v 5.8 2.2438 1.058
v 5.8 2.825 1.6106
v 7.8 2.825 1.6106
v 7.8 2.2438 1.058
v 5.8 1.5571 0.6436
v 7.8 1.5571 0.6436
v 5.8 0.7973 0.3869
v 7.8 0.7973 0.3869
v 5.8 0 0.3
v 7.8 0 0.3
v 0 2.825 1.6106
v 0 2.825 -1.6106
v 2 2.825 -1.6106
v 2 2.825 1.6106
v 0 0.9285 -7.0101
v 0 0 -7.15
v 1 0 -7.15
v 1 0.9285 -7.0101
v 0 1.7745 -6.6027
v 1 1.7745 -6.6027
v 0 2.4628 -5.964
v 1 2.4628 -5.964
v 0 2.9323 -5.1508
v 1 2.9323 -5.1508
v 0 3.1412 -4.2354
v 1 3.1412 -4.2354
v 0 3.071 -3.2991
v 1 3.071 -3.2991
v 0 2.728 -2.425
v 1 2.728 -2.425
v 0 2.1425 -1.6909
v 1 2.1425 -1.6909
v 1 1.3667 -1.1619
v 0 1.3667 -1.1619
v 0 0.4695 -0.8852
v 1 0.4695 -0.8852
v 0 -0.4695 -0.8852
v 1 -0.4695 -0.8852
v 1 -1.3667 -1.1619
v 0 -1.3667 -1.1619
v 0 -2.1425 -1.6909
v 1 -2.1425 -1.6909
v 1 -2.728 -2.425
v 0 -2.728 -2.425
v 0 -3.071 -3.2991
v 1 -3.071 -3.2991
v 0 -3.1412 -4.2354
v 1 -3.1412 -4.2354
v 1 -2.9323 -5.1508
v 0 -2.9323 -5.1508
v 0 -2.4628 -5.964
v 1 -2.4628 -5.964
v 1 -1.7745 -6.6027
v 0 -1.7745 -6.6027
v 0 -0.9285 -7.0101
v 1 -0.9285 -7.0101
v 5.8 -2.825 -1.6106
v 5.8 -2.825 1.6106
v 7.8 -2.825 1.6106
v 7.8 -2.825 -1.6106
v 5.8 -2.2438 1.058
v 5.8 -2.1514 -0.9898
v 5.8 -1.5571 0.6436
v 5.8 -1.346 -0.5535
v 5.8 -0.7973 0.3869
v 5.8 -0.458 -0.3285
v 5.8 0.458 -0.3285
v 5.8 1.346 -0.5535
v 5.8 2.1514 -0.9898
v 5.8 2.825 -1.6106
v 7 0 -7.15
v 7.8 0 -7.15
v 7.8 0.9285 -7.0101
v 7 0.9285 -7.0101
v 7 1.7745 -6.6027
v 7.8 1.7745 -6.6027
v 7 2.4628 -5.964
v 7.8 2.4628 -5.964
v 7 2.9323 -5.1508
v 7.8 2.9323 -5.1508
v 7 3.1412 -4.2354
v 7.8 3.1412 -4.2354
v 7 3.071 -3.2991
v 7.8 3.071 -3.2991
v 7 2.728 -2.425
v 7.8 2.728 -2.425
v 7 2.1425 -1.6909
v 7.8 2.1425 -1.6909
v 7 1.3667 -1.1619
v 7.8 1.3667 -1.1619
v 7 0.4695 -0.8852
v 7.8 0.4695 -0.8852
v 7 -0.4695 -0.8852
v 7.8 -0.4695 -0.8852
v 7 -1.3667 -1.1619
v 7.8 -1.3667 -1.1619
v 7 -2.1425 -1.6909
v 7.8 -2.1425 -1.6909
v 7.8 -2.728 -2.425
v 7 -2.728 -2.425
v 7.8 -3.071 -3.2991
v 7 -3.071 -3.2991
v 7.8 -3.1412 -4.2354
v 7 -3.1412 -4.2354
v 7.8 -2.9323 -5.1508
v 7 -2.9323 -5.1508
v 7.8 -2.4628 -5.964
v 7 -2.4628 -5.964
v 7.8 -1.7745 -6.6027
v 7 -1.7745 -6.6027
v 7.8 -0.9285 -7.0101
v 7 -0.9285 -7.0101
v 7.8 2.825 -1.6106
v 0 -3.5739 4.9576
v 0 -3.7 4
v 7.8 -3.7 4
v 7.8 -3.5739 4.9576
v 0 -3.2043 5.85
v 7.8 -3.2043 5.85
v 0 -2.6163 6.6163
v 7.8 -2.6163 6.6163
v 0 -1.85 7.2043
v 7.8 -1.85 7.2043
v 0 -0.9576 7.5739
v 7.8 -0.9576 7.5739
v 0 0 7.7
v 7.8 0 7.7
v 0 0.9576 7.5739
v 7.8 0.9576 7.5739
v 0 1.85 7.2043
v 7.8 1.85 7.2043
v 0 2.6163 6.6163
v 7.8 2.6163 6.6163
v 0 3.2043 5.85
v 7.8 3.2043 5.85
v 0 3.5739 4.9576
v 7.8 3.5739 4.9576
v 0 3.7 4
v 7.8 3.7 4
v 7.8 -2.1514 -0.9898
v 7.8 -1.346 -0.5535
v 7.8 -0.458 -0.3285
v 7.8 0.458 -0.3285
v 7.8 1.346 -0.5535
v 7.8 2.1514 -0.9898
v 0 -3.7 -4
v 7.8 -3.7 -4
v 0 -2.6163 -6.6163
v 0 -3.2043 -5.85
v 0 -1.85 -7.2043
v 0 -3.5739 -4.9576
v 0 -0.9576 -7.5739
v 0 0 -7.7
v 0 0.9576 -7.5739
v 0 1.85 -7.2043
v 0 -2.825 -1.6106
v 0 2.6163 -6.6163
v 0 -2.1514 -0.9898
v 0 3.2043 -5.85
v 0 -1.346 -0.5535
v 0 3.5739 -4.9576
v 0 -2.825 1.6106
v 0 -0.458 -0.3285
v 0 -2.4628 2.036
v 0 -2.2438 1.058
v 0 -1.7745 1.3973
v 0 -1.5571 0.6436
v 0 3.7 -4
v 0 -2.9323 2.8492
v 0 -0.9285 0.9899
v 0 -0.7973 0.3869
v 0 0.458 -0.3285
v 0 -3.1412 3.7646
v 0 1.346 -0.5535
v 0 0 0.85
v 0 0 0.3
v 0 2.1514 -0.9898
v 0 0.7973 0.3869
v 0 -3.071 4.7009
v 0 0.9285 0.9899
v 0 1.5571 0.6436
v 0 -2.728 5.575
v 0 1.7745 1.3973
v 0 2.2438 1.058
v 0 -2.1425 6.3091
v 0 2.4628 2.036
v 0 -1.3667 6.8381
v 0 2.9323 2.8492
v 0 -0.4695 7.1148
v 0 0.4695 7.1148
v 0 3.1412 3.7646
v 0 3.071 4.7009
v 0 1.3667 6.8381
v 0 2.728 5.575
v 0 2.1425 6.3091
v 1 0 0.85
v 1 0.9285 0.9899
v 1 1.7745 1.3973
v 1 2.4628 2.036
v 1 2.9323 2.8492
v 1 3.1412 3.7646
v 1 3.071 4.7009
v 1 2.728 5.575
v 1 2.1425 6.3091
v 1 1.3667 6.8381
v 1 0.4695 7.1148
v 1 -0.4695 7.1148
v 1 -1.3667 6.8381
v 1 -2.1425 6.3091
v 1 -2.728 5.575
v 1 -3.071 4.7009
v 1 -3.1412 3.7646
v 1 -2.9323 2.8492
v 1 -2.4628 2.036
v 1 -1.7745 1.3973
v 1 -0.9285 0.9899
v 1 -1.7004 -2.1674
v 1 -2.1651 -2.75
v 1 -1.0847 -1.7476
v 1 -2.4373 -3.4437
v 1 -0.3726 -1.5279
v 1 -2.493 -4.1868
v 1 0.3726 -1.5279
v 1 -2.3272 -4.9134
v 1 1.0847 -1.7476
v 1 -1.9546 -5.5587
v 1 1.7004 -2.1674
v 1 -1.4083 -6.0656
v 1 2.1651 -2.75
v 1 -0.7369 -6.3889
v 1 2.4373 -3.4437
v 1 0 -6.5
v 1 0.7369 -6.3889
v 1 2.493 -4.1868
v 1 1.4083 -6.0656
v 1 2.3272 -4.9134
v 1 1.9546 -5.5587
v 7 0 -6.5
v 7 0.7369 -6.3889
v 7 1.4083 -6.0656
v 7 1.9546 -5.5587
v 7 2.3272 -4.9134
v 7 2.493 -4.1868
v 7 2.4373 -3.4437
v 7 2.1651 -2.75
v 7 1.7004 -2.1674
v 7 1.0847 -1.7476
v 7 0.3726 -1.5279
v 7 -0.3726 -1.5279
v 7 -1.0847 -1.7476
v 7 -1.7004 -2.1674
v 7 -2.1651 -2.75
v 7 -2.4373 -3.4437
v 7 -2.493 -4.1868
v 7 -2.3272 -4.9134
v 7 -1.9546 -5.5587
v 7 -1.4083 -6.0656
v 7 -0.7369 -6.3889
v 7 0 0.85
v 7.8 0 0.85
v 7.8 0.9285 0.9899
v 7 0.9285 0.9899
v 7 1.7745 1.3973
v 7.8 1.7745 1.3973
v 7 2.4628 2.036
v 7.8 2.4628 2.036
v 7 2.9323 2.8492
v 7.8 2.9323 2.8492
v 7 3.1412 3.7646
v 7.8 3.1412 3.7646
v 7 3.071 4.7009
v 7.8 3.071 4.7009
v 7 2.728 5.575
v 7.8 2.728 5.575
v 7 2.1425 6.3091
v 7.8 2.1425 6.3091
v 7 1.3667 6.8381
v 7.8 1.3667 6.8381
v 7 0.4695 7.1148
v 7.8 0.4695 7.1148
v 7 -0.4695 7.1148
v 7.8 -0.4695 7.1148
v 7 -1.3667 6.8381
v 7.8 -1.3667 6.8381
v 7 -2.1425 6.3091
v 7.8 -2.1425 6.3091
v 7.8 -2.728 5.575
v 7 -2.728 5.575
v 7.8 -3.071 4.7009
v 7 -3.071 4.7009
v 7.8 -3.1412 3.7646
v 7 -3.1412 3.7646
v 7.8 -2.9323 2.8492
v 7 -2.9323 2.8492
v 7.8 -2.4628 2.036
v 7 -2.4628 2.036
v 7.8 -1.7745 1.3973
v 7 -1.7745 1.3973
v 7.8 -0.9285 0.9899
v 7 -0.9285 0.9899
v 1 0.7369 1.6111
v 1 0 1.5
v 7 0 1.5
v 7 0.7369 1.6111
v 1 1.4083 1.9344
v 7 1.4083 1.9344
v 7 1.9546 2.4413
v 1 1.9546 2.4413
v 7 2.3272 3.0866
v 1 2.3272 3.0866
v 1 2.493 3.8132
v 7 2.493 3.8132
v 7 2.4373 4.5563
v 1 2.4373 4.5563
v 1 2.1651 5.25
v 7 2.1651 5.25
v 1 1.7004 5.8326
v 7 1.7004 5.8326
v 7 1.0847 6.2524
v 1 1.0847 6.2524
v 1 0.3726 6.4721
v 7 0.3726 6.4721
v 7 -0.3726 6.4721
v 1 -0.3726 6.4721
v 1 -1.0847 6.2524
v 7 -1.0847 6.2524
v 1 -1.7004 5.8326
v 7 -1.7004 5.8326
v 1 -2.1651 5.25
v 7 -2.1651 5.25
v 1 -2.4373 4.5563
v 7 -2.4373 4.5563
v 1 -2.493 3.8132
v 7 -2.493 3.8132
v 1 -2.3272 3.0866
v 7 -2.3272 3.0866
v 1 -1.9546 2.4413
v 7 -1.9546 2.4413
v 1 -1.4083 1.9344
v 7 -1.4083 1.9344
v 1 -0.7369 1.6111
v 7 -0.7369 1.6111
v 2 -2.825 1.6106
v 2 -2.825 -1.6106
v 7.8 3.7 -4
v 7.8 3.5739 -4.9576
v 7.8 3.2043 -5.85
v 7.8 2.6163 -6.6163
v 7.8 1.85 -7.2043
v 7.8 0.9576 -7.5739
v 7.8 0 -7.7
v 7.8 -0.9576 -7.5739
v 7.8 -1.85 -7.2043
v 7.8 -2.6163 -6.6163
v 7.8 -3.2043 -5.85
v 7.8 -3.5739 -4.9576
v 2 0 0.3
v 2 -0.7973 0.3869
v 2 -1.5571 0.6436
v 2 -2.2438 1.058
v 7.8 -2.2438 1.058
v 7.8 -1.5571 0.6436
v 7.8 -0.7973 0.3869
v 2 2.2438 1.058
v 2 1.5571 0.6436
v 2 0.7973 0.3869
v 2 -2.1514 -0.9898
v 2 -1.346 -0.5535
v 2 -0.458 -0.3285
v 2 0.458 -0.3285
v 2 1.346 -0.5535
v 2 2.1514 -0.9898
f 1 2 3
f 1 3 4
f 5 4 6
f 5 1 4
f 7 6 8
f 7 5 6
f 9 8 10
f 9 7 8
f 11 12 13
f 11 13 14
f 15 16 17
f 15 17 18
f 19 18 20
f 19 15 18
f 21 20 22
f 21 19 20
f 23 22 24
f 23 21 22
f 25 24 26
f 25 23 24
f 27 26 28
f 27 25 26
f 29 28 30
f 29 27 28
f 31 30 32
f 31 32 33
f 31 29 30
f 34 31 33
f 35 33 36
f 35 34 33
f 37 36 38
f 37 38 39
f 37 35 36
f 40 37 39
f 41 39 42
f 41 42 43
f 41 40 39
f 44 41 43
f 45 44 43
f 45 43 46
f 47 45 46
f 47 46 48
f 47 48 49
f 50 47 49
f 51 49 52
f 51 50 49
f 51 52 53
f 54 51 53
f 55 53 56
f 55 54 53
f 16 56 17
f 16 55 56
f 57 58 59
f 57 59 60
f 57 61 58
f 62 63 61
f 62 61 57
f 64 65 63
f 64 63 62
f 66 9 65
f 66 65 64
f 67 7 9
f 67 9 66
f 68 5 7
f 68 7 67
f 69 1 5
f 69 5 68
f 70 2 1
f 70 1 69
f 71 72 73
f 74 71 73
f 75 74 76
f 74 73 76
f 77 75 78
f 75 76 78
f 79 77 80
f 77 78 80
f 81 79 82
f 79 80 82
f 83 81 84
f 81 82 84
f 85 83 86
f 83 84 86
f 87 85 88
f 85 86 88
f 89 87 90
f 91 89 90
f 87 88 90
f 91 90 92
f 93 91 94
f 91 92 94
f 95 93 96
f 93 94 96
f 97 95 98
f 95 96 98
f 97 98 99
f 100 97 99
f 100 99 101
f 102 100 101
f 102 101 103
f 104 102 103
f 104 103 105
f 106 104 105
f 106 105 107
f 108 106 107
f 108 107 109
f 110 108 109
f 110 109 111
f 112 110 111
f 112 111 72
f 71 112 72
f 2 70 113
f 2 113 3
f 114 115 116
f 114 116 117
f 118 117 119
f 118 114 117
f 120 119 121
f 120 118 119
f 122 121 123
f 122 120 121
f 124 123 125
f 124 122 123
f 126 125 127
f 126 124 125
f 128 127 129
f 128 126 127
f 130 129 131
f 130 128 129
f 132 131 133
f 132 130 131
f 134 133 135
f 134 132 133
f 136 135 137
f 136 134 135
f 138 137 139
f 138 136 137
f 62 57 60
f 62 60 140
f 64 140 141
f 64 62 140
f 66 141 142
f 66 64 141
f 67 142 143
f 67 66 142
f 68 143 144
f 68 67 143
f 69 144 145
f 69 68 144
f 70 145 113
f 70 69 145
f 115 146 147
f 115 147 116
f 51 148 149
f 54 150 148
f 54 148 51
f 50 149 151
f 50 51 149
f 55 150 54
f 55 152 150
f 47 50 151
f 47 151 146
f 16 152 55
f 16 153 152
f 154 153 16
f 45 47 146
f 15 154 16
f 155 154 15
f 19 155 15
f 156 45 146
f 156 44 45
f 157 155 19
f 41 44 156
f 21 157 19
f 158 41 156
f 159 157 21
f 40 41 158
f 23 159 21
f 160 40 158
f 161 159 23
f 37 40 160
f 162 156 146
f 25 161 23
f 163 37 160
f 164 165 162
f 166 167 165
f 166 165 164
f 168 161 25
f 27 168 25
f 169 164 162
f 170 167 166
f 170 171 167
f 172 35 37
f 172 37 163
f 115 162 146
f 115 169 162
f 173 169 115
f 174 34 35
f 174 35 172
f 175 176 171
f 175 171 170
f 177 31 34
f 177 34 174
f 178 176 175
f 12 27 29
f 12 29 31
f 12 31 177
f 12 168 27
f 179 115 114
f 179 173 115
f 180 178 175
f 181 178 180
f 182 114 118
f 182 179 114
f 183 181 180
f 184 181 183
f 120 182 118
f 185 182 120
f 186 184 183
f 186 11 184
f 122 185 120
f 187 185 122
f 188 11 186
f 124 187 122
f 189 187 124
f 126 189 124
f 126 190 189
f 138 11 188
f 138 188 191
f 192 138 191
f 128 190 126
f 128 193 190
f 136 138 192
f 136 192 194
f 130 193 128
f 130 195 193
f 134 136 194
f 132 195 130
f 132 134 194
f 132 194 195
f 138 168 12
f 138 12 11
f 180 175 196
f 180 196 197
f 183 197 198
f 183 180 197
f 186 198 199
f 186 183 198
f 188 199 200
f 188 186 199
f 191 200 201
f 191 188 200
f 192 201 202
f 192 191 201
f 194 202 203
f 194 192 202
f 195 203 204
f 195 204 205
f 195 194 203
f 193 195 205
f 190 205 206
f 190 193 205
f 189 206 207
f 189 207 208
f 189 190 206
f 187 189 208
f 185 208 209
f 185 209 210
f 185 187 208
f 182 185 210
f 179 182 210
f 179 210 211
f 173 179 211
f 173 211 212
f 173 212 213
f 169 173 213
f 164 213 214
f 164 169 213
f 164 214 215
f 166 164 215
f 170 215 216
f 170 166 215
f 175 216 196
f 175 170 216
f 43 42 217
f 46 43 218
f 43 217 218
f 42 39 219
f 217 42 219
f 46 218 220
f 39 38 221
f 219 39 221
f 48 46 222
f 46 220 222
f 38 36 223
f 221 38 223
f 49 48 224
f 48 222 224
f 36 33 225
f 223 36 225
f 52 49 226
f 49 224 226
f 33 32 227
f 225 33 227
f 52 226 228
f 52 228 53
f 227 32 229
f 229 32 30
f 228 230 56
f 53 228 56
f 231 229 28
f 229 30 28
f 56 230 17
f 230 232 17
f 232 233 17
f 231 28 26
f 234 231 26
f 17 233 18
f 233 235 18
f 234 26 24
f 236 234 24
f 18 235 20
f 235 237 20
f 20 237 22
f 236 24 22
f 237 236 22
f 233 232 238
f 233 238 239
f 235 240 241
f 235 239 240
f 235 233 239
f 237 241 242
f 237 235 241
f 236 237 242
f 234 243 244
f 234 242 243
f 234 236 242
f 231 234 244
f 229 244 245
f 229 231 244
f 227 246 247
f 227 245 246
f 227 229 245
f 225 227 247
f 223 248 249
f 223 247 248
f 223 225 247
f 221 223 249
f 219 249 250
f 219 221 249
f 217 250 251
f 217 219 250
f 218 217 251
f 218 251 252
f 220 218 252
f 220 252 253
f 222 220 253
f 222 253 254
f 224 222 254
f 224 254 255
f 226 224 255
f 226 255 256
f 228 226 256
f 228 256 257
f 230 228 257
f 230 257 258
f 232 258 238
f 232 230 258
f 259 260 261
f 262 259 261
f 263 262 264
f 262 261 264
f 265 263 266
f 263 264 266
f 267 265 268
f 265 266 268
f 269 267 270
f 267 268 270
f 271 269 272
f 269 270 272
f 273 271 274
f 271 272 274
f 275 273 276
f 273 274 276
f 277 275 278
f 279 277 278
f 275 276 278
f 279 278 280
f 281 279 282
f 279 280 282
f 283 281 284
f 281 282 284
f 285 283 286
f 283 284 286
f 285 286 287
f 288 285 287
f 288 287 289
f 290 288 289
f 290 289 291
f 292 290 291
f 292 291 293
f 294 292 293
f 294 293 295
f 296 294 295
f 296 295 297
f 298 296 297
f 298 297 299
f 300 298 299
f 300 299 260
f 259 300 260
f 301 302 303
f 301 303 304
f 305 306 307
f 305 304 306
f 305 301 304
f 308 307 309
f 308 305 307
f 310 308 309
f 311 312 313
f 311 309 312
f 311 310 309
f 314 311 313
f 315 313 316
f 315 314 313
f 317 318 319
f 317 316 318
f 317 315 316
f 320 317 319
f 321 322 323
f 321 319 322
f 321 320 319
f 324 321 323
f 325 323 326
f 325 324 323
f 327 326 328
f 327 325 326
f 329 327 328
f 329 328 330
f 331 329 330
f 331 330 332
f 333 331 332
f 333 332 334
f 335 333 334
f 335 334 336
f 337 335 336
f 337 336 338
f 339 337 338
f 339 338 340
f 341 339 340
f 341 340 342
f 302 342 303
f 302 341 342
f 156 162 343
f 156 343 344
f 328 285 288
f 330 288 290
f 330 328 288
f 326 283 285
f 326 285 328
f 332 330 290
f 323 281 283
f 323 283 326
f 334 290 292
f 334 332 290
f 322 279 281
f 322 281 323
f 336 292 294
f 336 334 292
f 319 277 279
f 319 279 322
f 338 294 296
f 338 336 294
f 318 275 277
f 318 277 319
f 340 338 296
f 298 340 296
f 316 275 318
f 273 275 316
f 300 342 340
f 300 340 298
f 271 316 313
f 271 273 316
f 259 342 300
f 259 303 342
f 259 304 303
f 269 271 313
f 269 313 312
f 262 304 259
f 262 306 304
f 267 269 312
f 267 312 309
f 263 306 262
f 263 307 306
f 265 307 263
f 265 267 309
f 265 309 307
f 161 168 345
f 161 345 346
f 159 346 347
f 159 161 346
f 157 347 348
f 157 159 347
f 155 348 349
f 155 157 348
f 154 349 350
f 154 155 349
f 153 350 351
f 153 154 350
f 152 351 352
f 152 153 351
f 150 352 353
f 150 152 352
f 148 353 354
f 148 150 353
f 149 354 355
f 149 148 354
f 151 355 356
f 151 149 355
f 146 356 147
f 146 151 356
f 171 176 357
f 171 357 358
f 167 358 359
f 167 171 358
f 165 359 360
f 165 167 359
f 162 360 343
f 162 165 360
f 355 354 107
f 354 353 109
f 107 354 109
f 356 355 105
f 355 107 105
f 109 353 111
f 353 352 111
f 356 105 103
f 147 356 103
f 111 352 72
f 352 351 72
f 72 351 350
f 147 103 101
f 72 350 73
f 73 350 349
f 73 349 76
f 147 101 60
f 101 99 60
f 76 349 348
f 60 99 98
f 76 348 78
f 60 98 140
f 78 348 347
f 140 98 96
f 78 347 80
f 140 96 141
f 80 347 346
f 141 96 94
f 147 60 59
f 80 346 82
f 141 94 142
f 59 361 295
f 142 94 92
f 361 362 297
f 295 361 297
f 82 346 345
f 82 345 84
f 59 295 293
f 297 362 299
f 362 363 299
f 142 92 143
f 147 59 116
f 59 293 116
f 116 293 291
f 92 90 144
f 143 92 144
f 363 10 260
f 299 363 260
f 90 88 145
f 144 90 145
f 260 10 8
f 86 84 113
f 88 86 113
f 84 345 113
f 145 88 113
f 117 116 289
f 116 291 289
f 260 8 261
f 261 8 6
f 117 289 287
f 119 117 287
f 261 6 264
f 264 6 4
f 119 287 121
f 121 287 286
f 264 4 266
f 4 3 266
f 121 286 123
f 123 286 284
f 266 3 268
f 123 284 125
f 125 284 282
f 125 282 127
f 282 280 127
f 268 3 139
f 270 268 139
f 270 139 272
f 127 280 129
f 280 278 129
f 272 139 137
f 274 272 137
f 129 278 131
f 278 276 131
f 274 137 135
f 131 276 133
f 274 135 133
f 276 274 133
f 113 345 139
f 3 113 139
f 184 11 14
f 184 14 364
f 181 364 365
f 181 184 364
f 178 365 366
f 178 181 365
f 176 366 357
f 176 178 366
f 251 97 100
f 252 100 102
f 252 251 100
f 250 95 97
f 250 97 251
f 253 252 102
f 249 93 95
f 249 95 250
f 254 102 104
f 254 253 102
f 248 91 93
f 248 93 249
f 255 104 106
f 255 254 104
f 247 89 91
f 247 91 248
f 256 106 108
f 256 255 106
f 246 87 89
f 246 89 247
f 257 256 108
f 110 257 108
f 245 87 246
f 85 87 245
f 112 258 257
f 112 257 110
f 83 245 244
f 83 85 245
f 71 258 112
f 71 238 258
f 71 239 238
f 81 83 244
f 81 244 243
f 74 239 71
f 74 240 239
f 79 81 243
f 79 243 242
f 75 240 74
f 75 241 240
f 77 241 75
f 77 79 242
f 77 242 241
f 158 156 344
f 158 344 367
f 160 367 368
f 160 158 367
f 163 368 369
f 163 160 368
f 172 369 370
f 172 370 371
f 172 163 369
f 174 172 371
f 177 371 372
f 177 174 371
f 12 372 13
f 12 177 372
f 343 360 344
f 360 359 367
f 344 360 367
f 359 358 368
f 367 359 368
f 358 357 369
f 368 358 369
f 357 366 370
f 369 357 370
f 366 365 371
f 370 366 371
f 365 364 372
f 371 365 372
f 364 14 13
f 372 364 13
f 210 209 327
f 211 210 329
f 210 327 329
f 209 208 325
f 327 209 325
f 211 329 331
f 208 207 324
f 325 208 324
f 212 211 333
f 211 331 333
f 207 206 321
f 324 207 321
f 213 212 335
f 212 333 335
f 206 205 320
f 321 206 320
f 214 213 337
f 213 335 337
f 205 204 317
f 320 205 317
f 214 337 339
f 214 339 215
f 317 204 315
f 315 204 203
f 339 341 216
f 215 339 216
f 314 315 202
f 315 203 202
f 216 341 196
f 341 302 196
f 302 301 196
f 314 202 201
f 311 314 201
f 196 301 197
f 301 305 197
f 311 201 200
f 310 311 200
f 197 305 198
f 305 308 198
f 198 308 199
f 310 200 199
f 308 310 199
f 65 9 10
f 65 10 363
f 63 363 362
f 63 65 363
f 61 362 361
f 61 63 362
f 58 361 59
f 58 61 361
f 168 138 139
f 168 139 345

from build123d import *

# Parameters (mm, degrees)
EXTRUDE_1_DEPTH          = 7.8
CUT_EXTRUDE_1_DEPTH      = 12.568059474
CUT_EXTRUDE_1_DEPTH_BACK = 12.568059474
SKETCH_2_3_R             = 2.5
SKETCH_2_6_R             = 3.15
CUT_EXTRUDE_6_DEPTH      = 1
CUT_EXTRUDE_START        = -2
CUT_EXTRUDE_7_DEPTH      = 2
CUT_EXTRUDE_START_2      = -7.8
CUT_EXTRUDE_8_DEPTH      = 2


with BuildPart() as part:
    # 草图2 → 凸台-拉伸1 (new body)
    with BuildSketch(Plane(origin=(0, 0, 0), x_dir=(0, 0, -1), z_dir=(1, 0, 0))):
        with BuildLine():
            Line((-4, 3.7), (4, 3.7))
            ThreePointArc((4, 3.7), (7.7, 0), (4, -3.7))
            Line((4, -3.7), (-4, -3.7))
            ThreePointArc((-4, -3.7), (-7.7, 0), (-4, 3.7))
        make_face()
    extrude(amount=EXTRUDE_1_DEPTH)

    # 草图2<3> → 切除-拉伸1 (cut, two sides: drawn at the far end of the back side and taken through both)
    with BuildSketch(Plane(origin=(0, 0, 0), x_dir=(0, 0, -1), z_dir=(1, 0, 0)).offset(-CUT_EXTRUDE_1_DEPTH_BACK)):
        with Locations((-4, 0)):
            Circle(SKETCH_2_3_R)
        with Locations((4, 0)):
            Circle(SKETCH_2_3_R)
    extrude(amount=CUT_EXTRUDE_1_DEPTH + CUT_EXTRUDE_1_DEPTH_BACK, mode=Mode.SUBTRACT)

    # 草图2<6> → 切除-拉伸6 (cut)
    with BuildSketch(Plane(origin=(0, 0, 0), x_dir=(0, 0, -1), z_dir=(1, 0, 0))):
        with Locations((-4, 0)):
            Circle(SKETCH_2_6_R)
        with Locations((4, 0)):
            Circle(SKETCH_2_6_R)
    cut_extrude_6 = extrude(amount=CUT_EXTRUDE_6_DEPTH, mode=Mode.SUBTRACT)

    # 镜向1: 切除-拉伸6 across plane
    add(cut_extrude_6.mirror(Plane(origin=(4, 0, 0), x_dir=(0, 0, 1), z_dir=(1, 0, 0))), mode=Mode.SUBTRACT)

    # 草图3 → 切除-拉伸7 (cut)
    with BuildSketch(Plane(origin=(7.8, 0, 0), x_dir=(0, 0, -1), z_dir=(1, 0, 0)).offset(CUT_EXTRUDE_START)):
        with BuildLine():
            Line((1.610570152, 2.825), (-1.610570152, 2.825))
            ThreePointArc((-1.610570152, 2.825), (-0.643596386, 1.557098192), (-0.3, 0))
            ThreePointArc((-0.3, 0), (-0.643596386, -1.557098192), (-1.610570152, -2.825))
            Line((-1.610570152, -2.825), (1.610570152, -2.825))
            ThreePointArc((1.610570152, -2.825), (0.3, 0), (1.610570152, 2.825))
        make_face()
    extrude(amount=CUT_EXTRUDE_7_DEPTH, mode=Mode.SUBTRACT)

    # 草图3<3> → 切除-拉伸8 (cut)
    with BuildSketch(Plane(origin=(7.8, 0, 0), x_dir=(0, 0, -1), z_dir=(1, 0, 0)).offset(CUT_EXTRUDE_START_2)):
        with BuildLine():
            Line((1.610570152, 2.825), (-1.610570152, 2.825))
            ThreePointArc((-1.610570152, 2.825), (-0.643596386, 1.557098192), (-0.3, 0))
            ThreePointArc((-0.3, 0), (-0.643596386, -1.557098192), (-1.610570152, -2.825))
            Line((-1.610570152, -2.825), (1.610570152, -2.825))
            ThreePointArc((1.610570152, -2.825), (0.3, 0), (1.610570152, 2.825))
        make_face()
    extrude(amount=CUT_EXTRUDE_8_DEPTH, mode=Mode.SUBTRACT)


solid = part.part
